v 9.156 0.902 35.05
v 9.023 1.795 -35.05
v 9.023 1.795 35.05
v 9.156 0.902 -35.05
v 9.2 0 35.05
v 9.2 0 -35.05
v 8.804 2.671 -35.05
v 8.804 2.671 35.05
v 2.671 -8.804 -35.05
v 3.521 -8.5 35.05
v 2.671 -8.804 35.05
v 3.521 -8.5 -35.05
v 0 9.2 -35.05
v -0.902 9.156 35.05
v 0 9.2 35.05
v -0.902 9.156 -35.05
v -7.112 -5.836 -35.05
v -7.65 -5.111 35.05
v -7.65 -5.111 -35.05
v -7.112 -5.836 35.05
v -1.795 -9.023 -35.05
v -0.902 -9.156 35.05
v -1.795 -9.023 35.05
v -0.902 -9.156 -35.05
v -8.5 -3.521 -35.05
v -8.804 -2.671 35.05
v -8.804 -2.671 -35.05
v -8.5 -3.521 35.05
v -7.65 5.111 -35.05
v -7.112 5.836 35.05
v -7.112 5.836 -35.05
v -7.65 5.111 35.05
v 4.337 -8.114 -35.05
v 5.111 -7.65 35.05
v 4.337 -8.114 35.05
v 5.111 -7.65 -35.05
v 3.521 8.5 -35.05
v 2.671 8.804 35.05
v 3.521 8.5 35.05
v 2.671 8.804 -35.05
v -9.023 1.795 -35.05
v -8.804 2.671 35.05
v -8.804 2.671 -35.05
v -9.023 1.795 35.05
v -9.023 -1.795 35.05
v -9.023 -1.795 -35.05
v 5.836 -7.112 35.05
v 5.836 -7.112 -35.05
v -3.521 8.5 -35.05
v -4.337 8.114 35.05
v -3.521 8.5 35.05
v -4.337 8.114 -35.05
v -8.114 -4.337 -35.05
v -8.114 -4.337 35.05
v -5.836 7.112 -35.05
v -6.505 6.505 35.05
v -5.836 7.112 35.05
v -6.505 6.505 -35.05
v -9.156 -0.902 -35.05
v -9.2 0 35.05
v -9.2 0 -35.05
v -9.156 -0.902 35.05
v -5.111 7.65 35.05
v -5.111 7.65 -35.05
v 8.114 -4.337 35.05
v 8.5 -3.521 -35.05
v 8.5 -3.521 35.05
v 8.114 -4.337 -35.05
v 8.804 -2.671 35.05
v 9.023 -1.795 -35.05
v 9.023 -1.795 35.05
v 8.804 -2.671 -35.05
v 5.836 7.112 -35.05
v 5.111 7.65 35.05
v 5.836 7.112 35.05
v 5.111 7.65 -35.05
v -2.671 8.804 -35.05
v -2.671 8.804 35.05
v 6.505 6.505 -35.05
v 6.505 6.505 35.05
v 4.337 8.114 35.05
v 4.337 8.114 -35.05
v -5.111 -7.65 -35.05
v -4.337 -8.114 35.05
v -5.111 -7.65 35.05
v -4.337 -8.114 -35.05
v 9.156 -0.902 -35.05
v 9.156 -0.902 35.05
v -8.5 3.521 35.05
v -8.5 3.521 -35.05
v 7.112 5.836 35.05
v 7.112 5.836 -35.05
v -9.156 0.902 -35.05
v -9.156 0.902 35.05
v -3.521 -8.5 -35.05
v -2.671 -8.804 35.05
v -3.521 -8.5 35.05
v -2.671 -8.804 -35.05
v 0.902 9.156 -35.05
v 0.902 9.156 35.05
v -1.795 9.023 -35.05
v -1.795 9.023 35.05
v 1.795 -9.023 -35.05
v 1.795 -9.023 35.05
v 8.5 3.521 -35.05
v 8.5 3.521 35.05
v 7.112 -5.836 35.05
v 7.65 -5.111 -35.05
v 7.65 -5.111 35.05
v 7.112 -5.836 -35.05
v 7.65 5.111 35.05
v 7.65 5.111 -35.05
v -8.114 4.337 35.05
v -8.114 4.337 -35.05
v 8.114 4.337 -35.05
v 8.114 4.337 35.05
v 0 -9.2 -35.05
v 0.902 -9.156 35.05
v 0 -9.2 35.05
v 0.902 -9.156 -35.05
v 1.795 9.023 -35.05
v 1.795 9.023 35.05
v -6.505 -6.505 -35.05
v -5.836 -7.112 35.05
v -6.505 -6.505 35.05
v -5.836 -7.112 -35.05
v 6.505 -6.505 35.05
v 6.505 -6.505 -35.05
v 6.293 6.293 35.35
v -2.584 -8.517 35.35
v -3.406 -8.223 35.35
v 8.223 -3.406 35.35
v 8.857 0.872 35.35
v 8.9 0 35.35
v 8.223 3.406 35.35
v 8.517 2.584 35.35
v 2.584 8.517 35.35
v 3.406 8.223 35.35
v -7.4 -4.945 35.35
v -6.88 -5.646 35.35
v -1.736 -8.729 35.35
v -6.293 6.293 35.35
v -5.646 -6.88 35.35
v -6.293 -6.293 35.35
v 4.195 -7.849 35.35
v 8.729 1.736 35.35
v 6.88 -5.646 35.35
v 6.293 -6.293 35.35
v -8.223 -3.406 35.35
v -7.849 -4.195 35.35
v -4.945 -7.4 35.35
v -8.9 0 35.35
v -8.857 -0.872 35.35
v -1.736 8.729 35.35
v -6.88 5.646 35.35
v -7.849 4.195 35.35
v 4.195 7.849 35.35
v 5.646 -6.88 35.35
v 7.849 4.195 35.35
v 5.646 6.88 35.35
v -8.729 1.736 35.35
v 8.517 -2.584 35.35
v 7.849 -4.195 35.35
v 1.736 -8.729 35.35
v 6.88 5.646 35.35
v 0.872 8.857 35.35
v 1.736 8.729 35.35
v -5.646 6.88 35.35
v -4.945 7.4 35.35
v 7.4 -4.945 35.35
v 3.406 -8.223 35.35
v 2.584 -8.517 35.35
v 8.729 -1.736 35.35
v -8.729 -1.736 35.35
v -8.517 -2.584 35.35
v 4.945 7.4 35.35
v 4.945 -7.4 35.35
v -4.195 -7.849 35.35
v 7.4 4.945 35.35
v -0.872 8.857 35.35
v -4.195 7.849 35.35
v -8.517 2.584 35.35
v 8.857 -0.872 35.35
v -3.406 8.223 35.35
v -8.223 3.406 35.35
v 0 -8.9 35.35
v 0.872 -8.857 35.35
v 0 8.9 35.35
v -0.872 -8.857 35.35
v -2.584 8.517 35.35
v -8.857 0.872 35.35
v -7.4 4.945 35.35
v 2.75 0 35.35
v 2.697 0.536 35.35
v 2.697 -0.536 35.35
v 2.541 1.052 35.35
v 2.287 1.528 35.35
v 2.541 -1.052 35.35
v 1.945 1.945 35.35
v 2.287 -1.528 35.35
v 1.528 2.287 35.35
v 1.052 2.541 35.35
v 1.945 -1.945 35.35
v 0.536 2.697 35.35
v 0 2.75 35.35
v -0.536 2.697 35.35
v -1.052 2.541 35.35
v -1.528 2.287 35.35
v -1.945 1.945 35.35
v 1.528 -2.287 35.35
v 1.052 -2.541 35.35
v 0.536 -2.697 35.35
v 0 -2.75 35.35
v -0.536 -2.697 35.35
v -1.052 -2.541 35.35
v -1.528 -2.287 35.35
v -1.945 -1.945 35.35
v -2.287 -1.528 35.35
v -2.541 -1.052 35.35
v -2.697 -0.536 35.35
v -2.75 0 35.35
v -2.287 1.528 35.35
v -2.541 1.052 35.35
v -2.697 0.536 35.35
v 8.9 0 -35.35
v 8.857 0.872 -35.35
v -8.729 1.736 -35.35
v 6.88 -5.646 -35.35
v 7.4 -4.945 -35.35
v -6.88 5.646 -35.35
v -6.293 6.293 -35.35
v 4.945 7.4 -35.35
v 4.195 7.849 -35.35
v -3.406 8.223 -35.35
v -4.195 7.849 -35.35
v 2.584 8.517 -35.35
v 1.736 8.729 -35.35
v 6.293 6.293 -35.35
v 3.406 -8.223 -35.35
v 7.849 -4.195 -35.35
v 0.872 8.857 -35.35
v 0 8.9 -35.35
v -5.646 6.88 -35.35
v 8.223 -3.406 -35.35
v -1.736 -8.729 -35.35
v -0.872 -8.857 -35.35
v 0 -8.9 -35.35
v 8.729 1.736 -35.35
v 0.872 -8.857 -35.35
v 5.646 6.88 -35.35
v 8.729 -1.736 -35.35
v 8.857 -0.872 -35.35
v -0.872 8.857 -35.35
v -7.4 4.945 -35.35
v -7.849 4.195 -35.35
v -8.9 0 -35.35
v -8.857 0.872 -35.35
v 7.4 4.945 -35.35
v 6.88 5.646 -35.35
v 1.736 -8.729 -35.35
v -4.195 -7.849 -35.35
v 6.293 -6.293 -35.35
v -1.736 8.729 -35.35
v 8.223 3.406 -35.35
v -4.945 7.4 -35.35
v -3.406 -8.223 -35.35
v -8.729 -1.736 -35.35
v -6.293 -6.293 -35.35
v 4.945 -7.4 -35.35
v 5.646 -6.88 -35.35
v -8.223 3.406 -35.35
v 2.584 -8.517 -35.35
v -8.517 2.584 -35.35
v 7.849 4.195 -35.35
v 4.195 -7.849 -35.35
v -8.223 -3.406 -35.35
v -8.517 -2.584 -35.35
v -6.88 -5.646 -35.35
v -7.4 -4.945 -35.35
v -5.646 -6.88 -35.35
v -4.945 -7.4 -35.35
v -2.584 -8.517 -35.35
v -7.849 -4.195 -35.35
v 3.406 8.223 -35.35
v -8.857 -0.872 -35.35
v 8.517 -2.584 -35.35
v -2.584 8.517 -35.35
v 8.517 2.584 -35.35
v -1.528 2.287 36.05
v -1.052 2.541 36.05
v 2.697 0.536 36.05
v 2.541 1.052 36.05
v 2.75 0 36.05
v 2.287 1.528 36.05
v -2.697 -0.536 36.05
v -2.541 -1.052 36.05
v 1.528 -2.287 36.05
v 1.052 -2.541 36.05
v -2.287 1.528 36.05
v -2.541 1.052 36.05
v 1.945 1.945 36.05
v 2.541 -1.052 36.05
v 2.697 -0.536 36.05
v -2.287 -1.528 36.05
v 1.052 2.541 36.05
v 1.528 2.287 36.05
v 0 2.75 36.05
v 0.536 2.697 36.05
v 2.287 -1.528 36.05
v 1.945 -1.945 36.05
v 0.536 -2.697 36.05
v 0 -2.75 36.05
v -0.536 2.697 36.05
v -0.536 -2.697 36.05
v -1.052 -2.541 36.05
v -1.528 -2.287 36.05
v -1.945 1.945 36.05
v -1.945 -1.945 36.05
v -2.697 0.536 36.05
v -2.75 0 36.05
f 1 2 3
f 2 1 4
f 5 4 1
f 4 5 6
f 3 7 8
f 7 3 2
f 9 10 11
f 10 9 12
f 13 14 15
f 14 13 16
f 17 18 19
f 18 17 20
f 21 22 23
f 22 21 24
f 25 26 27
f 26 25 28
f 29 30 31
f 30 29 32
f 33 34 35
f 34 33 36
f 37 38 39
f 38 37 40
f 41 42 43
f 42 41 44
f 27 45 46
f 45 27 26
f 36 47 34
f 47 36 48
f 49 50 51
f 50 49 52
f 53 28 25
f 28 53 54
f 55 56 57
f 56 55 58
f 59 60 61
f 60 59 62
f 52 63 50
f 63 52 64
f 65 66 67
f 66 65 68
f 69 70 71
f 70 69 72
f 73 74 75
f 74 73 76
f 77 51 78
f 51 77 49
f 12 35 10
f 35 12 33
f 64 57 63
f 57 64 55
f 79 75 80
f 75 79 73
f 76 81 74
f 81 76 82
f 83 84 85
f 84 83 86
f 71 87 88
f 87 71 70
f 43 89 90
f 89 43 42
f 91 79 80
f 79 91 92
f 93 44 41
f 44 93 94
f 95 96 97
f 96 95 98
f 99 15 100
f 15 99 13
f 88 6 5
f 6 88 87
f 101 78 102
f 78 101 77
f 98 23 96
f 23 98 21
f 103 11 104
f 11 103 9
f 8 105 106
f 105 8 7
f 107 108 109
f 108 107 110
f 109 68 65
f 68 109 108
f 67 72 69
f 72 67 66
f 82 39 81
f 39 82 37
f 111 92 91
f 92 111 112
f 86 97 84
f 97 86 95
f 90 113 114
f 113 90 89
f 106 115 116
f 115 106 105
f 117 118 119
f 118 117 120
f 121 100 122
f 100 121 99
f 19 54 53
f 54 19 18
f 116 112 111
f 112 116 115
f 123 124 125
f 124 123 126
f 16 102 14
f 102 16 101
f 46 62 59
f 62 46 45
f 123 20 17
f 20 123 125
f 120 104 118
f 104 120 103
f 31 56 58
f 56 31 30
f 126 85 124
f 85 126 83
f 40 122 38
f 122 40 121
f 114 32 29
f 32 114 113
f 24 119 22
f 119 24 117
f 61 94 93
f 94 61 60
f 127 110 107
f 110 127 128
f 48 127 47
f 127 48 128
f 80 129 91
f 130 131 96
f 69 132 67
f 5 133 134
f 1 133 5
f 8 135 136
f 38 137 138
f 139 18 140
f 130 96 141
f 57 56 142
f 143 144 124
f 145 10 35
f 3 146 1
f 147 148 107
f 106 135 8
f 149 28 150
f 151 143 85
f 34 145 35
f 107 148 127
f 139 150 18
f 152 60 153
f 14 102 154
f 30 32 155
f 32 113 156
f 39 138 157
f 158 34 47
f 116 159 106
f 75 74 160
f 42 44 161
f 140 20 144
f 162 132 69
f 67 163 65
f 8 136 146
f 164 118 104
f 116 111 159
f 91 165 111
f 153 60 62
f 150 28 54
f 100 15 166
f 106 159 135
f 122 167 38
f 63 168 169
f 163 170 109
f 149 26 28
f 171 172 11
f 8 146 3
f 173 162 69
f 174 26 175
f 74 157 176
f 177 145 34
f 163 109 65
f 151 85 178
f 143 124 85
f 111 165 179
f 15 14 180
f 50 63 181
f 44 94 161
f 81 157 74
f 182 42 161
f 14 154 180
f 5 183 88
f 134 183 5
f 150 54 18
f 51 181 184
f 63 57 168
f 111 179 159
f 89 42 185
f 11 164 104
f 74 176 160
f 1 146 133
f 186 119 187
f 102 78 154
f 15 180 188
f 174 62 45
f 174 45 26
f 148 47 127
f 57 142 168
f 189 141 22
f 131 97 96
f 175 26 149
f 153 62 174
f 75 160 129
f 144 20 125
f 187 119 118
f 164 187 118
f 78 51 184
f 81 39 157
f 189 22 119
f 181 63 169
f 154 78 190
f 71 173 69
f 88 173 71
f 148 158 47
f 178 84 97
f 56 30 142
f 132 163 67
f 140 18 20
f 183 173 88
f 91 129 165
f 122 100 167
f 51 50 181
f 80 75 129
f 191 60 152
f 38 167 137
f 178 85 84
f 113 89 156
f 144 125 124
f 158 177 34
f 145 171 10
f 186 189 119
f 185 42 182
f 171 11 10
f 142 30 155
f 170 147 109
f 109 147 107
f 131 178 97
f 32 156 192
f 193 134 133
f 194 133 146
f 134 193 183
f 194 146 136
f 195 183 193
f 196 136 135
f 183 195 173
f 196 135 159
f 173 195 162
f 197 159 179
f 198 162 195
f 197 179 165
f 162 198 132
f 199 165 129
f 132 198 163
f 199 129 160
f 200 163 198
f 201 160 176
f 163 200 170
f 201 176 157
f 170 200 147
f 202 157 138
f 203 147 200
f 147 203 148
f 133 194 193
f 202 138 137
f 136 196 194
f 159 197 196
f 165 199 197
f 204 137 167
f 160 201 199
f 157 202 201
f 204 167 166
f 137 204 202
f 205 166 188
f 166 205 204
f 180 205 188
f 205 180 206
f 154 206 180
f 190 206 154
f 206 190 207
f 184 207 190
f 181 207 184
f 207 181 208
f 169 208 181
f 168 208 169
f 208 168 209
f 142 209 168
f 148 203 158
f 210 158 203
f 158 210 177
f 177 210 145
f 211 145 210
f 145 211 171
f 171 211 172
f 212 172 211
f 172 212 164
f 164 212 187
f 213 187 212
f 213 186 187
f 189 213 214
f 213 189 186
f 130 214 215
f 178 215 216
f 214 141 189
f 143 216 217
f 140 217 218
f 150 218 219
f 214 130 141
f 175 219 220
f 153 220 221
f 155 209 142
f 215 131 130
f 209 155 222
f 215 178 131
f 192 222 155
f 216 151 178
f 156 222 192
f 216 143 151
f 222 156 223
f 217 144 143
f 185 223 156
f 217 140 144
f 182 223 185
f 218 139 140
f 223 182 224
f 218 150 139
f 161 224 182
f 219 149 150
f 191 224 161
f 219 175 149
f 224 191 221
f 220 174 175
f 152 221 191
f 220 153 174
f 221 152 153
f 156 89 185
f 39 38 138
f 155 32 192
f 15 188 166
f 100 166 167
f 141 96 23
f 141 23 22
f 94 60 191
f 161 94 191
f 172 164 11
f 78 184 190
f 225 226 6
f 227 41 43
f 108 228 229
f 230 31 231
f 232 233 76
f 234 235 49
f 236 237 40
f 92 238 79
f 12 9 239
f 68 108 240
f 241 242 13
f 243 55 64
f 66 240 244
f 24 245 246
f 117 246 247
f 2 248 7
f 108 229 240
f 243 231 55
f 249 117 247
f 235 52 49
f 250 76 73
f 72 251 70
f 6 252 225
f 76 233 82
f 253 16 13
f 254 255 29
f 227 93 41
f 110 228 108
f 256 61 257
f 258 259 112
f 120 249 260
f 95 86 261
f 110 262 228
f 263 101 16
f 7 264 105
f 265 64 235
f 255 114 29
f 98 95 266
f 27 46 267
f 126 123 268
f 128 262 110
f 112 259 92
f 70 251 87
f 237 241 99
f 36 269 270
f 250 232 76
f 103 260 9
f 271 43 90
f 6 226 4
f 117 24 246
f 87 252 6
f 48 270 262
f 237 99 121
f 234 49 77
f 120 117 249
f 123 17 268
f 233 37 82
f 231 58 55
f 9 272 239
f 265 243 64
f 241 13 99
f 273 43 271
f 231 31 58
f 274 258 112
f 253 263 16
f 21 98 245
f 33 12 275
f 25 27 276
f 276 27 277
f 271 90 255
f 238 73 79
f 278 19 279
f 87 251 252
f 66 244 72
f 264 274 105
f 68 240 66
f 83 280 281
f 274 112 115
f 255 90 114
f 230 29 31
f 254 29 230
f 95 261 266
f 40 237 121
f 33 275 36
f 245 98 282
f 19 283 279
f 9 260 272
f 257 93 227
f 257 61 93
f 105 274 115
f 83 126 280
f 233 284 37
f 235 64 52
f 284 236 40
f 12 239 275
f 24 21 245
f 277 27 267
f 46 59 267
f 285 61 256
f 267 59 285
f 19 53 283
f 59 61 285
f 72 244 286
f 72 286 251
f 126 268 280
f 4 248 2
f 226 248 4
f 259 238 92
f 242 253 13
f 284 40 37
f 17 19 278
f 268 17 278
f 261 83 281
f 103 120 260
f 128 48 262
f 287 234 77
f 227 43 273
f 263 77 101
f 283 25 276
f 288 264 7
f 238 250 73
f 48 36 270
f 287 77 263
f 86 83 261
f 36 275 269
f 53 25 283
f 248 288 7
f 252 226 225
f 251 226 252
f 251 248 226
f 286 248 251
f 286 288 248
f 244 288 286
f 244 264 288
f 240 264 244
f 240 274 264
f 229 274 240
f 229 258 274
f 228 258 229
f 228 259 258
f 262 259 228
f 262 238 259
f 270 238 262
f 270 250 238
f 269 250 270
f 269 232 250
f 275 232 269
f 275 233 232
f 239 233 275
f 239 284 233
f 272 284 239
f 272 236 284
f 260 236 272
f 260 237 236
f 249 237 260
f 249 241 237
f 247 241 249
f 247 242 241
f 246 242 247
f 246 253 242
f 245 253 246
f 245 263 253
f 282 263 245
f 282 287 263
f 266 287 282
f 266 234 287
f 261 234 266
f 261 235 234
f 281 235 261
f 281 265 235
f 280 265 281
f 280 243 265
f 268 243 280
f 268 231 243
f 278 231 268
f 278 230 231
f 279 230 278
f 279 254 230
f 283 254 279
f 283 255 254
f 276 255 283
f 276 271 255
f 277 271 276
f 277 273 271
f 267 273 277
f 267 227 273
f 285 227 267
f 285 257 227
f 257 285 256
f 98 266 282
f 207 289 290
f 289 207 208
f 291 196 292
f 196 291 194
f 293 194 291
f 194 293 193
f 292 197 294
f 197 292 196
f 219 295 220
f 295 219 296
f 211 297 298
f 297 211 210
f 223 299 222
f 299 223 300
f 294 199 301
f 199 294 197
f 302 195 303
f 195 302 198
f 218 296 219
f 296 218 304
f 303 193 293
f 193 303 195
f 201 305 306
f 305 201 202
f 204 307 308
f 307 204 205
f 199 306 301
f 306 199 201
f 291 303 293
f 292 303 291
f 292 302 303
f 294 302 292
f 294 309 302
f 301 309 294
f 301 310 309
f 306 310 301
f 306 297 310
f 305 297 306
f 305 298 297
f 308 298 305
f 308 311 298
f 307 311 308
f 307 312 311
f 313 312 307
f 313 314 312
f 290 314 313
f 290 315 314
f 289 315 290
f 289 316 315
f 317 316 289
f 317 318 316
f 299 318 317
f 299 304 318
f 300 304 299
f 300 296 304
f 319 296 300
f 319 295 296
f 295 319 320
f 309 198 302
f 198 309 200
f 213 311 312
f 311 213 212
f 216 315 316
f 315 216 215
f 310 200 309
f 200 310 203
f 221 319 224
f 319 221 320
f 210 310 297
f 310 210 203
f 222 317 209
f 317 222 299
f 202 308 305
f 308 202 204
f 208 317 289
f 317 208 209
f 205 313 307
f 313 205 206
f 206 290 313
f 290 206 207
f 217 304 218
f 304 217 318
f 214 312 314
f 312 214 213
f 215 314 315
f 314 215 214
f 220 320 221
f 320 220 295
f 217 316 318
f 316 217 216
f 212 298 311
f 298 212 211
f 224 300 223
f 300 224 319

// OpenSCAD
// Parameters
height_mm = 70.7; //[35.35:141.4:0.1]
diameter_mm = 18.4; //[9.2:36.8:0.1]
positive_terminal_height_mm = 1.5; //[0.75:3:0.1]
positive_terminal_diameter_mm = 5.5; //[2.75:11:0.1]
negative_terminal_height_mm = 0.2; //[0.1:0.4:0.05]
negative_terminal_diameter_mm = 6; //[3:12:0.1]
edge_chamfer_mm = 0.3; //[0.15:0.6:0.05]
overlap_mm = 0.8; //[0.5:2:0.1]

// Battery - complete geometry
module battery() {
  color("DimGray") {
    // Battery cell body
    union() {
      // Core
      translate([0, 0, 0])
        cylinder(r=diameter_mm/2, h=height_mm - 2*edge_chamfer_mm, center=true, $fn=64);
      
      // Top chamfer
      translate([0, 0, (height_mm - 2*edge_chamfer_mm)/2 + edge_chamfer_mm/2])
        cylinder(r1=diameter_mm/2, r2=diameter_mm/2 - edge_chamfer_mm, h=edge_chamfer_mm, center=true, $fn=64);
      
      // Bottom chamfer
      translate([0, 0, -((height_mm - 2*edge_chamfer_mm)/2 + edge_chamfer_mm/2)])
        cylinder(r1=diameter_mm/2 - edge_chamfer_mm, r2=diameter_mm/2, h=edge_chamfer_mm, center=true, $fn=64);
    }
    
    // Positive terminal button
    translate([0, 0, height_mm/2 + positive_terminal_height_mm/2 - overlap_mm])
      cylinder(r=positive_terminal_diameter_mm/2, h=positive_terminal_height_mm, center=true, $fn=32);
    
    // Negative terminal flat end
    translate([0, 0, -height_mm/2 - negative_terminal_height_mm/2 + overlap_mm])
      cylinder(r=negative_terminal_diameter_mm/2, h=negative_terminal_height_mm, center=true, $fn=32);
  }
}

// Assembly
module assembly() {
  battery();
}

assembly();
